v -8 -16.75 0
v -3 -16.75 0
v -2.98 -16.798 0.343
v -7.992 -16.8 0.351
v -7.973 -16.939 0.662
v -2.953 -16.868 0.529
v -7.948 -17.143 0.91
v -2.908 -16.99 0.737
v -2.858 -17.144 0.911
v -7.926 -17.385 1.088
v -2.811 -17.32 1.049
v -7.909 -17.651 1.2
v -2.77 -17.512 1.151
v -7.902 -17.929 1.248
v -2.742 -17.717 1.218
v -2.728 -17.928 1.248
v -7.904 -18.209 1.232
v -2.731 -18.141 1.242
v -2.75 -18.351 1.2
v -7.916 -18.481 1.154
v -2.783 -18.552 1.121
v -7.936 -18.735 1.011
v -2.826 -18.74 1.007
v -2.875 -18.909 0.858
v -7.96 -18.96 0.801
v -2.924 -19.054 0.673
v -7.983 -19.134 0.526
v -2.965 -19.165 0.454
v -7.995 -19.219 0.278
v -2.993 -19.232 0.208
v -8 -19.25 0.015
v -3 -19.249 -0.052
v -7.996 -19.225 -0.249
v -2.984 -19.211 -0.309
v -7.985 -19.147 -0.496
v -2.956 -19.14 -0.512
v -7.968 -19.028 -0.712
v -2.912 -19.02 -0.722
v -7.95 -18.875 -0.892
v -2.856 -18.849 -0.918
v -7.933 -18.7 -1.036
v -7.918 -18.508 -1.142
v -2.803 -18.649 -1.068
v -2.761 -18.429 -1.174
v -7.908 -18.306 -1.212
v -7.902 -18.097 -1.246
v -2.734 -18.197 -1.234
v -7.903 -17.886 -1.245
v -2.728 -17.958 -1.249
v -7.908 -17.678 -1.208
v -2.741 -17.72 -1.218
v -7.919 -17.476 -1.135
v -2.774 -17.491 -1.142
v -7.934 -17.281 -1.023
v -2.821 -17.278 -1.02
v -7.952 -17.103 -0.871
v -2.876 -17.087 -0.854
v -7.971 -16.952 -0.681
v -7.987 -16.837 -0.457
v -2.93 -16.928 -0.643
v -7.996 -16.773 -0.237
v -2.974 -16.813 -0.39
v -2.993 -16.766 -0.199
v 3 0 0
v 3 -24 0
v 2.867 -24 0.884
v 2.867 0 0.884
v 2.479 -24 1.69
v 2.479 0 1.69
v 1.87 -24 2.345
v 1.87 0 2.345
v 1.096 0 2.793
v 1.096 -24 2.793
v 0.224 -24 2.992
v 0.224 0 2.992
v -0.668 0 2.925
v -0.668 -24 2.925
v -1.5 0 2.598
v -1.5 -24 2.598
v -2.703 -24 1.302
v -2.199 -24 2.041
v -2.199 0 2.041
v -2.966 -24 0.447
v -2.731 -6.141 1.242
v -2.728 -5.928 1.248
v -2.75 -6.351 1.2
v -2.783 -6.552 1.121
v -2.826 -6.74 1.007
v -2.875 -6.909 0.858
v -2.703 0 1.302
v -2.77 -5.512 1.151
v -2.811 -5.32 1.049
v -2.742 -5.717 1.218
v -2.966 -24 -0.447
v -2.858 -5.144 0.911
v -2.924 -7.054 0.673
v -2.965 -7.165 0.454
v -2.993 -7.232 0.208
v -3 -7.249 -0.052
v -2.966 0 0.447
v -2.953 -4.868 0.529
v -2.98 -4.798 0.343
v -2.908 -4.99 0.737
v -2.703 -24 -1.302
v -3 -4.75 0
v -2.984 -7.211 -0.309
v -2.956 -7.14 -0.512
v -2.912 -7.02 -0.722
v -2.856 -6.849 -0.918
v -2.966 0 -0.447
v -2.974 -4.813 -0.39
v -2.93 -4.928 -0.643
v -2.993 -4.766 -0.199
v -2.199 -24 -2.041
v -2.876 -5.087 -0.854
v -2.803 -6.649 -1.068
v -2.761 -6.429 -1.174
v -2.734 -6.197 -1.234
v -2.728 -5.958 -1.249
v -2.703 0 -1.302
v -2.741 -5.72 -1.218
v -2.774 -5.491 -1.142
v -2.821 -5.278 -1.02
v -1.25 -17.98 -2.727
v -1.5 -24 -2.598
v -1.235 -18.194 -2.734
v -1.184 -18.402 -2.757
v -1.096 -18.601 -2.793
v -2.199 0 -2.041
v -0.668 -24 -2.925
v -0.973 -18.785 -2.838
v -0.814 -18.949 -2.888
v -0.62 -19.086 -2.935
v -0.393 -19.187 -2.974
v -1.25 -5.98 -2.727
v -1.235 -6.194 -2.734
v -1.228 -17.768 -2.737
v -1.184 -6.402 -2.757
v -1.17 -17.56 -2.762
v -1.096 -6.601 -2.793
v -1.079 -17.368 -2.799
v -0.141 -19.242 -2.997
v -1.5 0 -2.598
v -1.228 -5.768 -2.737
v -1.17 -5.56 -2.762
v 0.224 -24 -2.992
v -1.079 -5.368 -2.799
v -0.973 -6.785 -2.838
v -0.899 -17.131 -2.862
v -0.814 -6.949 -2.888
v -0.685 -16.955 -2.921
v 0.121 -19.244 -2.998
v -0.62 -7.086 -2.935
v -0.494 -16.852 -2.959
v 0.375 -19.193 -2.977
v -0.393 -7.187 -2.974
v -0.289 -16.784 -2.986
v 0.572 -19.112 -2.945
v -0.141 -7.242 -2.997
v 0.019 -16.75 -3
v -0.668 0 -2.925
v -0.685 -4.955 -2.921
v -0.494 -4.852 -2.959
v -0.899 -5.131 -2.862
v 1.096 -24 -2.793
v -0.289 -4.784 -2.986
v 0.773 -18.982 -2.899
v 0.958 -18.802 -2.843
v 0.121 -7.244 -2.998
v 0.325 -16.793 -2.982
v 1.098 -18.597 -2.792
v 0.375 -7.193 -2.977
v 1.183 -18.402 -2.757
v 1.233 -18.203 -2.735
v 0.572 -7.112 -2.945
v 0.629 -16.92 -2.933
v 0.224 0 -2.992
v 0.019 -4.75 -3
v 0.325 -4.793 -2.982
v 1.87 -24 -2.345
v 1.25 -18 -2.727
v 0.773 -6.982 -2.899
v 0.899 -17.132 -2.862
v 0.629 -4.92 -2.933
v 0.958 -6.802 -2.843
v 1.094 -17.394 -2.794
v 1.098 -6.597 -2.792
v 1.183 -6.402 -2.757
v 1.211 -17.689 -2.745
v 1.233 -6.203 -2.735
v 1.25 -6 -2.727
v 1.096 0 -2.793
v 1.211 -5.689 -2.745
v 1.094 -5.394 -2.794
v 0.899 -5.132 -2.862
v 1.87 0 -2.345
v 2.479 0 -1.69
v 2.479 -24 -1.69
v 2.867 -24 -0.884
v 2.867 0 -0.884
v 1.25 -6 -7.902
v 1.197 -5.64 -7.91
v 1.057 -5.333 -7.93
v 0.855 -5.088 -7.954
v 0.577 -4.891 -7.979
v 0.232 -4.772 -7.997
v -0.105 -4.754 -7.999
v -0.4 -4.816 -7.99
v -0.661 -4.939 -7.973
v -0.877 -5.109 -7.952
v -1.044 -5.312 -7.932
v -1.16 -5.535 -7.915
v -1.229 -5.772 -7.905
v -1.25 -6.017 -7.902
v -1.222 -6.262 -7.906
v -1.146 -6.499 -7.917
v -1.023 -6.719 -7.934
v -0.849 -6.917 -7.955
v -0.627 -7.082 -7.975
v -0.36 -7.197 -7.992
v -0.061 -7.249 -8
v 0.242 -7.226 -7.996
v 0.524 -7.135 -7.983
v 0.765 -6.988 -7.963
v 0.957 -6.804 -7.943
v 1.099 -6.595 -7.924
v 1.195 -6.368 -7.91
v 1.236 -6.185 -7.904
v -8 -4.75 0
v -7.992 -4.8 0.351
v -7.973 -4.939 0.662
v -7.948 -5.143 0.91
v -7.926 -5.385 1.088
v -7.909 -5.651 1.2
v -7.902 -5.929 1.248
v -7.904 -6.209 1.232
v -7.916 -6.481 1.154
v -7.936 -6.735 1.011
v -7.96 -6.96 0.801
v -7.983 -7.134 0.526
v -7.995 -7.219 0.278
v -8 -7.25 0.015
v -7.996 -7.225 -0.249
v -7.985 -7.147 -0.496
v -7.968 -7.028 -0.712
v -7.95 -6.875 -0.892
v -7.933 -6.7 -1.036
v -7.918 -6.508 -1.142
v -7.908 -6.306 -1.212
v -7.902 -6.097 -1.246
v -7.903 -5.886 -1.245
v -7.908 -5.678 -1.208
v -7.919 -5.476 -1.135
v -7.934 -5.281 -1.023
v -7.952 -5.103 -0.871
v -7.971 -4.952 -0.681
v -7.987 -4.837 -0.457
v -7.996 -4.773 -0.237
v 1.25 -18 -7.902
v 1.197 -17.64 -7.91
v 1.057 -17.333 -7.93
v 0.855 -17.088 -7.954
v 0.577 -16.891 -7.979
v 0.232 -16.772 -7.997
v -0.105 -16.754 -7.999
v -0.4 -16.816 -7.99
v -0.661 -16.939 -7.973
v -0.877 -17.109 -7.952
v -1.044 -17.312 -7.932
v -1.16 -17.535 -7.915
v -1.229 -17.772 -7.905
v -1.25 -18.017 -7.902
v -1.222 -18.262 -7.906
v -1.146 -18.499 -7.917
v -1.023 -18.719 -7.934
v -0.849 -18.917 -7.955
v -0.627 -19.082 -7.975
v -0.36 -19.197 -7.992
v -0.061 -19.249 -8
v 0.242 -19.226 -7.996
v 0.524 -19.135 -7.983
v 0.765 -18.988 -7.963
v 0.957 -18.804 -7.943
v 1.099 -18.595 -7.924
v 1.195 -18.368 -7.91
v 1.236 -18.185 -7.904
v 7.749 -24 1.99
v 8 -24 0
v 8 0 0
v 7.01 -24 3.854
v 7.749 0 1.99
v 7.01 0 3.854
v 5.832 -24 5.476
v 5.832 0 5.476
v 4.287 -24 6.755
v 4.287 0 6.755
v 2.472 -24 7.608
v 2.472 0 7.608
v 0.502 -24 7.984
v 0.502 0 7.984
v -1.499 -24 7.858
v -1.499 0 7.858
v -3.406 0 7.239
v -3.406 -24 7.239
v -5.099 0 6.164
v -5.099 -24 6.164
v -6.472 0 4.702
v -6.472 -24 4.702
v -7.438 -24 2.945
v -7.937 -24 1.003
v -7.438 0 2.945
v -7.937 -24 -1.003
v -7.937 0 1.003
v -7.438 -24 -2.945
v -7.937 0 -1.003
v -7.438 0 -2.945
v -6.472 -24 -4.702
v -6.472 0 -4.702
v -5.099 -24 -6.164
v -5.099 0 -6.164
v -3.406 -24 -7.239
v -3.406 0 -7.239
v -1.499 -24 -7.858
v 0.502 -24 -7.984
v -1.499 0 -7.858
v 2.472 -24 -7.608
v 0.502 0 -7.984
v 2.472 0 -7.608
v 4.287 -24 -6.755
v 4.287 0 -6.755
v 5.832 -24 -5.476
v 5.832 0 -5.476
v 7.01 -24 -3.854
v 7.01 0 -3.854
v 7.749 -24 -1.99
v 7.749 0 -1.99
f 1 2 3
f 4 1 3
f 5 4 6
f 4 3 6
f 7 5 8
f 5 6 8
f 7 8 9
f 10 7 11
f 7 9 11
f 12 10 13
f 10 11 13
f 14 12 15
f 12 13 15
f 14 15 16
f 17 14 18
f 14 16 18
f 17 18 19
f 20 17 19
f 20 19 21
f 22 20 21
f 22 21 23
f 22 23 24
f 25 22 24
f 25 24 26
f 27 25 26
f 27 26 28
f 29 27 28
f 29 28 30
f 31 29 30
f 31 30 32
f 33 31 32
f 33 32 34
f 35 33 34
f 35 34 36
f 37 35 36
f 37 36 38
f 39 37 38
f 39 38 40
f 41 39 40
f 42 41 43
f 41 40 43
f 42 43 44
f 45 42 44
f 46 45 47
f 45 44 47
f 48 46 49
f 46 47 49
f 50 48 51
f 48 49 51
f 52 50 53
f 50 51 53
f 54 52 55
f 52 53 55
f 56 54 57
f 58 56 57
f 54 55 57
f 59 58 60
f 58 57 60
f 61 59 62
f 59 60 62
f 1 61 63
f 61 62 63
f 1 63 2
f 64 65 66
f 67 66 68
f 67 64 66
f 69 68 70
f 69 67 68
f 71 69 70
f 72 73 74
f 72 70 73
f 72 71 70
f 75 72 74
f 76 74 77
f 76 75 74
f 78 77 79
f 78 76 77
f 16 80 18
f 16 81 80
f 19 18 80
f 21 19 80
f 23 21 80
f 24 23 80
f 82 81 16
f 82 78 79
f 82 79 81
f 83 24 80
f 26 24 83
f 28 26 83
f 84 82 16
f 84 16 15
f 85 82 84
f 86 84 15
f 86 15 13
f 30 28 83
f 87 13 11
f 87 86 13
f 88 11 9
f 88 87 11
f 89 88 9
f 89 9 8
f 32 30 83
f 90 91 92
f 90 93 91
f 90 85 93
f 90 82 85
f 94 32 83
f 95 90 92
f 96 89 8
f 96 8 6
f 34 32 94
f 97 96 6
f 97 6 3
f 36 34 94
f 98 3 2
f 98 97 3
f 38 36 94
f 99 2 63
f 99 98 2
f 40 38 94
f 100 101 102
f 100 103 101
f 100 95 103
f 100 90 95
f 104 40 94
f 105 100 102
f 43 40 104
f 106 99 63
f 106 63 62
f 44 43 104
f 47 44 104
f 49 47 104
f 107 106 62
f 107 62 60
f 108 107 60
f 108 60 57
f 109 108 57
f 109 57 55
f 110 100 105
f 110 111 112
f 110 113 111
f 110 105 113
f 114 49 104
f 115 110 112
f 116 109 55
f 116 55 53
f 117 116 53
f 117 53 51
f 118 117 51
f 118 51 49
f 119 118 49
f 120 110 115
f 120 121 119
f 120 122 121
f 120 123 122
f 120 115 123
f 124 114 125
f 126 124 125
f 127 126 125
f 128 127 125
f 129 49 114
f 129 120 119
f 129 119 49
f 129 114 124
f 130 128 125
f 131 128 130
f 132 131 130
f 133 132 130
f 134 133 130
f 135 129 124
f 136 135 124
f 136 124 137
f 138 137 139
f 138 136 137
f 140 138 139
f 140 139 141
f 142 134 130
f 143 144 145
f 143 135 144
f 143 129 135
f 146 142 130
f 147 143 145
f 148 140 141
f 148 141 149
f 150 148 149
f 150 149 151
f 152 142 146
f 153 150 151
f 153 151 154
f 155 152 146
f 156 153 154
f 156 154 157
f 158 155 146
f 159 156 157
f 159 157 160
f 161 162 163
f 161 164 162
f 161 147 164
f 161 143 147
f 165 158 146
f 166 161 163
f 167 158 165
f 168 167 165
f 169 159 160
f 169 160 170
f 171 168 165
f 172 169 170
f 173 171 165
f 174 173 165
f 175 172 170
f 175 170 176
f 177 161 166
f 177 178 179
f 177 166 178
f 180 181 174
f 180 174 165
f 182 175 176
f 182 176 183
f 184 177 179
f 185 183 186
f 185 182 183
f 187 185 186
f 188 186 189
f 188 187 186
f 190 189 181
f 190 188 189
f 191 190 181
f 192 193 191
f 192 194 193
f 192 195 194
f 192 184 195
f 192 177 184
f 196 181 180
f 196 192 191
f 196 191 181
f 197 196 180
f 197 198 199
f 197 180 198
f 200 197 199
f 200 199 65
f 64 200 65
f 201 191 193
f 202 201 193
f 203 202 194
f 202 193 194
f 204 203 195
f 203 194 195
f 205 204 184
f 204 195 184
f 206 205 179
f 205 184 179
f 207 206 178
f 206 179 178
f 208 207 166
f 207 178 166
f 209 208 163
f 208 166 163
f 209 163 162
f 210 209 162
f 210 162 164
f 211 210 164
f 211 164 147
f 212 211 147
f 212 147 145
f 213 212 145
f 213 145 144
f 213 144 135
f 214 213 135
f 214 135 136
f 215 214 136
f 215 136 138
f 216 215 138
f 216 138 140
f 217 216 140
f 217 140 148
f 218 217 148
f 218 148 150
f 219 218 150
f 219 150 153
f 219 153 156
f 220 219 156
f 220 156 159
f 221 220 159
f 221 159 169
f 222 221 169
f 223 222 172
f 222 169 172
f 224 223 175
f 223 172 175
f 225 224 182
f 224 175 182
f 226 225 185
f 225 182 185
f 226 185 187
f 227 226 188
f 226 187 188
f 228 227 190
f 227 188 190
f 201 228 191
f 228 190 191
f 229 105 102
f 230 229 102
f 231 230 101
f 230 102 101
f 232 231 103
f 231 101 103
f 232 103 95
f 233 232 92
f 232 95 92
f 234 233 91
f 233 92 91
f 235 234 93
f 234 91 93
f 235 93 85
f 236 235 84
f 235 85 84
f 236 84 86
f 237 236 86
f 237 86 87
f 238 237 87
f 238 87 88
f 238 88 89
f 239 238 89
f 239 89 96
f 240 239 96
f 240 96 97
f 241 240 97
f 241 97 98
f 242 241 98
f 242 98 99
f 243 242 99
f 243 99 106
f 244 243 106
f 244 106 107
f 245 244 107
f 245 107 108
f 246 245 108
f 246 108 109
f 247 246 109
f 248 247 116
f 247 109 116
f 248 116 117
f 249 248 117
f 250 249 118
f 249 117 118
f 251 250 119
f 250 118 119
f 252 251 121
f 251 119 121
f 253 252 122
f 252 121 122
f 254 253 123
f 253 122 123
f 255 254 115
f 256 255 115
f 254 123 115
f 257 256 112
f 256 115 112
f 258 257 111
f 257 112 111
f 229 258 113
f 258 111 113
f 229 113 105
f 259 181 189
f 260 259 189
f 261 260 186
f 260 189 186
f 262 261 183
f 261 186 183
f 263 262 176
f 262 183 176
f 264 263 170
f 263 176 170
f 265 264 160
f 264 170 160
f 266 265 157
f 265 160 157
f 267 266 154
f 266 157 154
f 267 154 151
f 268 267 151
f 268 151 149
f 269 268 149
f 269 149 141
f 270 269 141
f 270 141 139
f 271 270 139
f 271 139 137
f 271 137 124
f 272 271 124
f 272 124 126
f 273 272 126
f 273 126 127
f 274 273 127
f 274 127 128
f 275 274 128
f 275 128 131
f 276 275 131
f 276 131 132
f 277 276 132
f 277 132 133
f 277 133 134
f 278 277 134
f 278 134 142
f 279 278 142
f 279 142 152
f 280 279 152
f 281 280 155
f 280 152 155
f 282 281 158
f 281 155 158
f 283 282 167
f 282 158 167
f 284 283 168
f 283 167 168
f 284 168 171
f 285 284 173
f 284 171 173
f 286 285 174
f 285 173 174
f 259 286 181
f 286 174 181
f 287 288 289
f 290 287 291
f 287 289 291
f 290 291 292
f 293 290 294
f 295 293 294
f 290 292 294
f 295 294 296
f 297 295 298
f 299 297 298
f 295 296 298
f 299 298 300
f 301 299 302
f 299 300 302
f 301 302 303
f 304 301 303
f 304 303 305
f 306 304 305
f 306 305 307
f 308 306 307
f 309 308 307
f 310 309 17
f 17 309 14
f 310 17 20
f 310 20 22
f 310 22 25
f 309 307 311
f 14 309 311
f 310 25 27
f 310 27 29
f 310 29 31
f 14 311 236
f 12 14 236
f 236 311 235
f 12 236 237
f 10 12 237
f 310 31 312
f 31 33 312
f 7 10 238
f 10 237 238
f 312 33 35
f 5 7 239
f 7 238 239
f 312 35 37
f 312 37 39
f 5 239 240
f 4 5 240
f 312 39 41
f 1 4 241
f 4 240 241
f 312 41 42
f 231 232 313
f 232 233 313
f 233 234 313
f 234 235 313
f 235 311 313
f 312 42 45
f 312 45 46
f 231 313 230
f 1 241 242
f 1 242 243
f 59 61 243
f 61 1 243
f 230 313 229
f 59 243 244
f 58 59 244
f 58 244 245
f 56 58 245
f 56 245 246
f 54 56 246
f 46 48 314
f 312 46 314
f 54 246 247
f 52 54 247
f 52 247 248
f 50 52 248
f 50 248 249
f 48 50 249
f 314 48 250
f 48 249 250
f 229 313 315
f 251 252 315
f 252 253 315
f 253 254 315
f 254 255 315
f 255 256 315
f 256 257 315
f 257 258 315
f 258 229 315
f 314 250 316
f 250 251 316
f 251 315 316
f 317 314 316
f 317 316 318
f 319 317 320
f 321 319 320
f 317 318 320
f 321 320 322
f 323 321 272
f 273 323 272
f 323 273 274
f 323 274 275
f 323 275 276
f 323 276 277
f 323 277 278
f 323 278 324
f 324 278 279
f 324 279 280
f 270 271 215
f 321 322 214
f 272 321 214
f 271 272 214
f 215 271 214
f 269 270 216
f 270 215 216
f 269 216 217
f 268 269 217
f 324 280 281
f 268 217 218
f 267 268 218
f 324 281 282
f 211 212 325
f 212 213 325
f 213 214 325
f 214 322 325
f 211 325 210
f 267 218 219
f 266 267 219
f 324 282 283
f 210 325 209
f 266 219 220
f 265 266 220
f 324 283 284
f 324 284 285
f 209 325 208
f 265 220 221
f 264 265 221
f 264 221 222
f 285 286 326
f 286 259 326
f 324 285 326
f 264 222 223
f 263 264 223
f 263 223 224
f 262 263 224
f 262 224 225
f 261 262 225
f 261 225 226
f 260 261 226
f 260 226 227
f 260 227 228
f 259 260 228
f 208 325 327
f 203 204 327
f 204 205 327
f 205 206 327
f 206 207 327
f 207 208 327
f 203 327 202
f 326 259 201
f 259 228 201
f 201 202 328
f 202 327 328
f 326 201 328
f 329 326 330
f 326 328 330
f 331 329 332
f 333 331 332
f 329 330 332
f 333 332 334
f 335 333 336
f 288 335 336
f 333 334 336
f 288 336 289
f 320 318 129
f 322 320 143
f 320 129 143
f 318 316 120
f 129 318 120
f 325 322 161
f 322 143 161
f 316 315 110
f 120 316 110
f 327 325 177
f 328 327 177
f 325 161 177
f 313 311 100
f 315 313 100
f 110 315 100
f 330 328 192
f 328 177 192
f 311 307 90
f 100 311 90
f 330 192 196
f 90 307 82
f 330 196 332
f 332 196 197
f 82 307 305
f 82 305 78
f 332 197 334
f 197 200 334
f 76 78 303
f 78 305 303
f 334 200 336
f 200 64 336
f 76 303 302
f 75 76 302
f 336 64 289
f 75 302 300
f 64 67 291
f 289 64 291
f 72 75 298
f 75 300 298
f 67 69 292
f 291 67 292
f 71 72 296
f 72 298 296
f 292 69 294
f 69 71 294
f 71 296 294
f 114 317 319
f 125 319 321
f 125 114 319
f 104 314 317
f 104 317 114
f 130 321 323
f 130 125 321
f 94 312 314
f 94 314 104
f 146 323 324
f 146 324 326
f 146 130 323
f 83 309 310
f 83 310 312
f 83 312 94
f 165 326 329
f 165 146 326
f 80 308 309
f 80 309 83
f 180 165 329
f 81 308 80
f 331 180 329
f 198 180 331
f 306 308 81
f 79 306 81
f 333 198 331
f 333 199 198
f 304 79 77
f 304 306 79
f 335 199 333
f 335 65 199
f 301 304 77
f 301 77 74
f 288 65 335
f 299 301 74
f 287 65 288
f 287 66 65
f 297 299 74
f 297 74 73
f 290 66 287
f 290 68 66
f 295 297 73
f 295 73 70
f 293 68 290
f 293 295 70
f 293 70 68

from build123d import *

# Parameters (mm, degrees)
F0_R     = 8
F1_DEPTH = 24
F2_R     = 3
F3_DEPTH = 24.001
F5_D     = 2.5
F5_DEPTH = 8.001
F7_D     = 2.5
F7_DEPTH = 8.0010001


with BuildPart() as f1:
    # F0 (on Front) → F1 (new body)
    with BuildSketch(Plane.XZ):
        Circle(F0_R)
    extrude(amount=F1_DEPTH)

    # F2 (on Front) → F3 (cut, through all)
    with BuildSketch(Plane.XZ):
        Circle(F2_R)
    extrude(amount=F3_DEPTH, mode=Mode.SUBTRACT)

    # F5 (through all, one way)
    with BuildSketch(Plane.YZ):
        with Locations((-18, 0), (-6, 0)):
            Circle(F5_D / 2)
    extrude(amount=-F5_DEPTH, mode=Mode.SUBTRACT)

    # F7 (through all, one way)
    with BuildSketch(Plane.XY):
        with Locations((0, -18), (0, -6)):
            Circle(F7_D / 2)
    extrude(amount=-F7_DEPTH, mode=Mode.SUBTRACT)


solid = f1.part
